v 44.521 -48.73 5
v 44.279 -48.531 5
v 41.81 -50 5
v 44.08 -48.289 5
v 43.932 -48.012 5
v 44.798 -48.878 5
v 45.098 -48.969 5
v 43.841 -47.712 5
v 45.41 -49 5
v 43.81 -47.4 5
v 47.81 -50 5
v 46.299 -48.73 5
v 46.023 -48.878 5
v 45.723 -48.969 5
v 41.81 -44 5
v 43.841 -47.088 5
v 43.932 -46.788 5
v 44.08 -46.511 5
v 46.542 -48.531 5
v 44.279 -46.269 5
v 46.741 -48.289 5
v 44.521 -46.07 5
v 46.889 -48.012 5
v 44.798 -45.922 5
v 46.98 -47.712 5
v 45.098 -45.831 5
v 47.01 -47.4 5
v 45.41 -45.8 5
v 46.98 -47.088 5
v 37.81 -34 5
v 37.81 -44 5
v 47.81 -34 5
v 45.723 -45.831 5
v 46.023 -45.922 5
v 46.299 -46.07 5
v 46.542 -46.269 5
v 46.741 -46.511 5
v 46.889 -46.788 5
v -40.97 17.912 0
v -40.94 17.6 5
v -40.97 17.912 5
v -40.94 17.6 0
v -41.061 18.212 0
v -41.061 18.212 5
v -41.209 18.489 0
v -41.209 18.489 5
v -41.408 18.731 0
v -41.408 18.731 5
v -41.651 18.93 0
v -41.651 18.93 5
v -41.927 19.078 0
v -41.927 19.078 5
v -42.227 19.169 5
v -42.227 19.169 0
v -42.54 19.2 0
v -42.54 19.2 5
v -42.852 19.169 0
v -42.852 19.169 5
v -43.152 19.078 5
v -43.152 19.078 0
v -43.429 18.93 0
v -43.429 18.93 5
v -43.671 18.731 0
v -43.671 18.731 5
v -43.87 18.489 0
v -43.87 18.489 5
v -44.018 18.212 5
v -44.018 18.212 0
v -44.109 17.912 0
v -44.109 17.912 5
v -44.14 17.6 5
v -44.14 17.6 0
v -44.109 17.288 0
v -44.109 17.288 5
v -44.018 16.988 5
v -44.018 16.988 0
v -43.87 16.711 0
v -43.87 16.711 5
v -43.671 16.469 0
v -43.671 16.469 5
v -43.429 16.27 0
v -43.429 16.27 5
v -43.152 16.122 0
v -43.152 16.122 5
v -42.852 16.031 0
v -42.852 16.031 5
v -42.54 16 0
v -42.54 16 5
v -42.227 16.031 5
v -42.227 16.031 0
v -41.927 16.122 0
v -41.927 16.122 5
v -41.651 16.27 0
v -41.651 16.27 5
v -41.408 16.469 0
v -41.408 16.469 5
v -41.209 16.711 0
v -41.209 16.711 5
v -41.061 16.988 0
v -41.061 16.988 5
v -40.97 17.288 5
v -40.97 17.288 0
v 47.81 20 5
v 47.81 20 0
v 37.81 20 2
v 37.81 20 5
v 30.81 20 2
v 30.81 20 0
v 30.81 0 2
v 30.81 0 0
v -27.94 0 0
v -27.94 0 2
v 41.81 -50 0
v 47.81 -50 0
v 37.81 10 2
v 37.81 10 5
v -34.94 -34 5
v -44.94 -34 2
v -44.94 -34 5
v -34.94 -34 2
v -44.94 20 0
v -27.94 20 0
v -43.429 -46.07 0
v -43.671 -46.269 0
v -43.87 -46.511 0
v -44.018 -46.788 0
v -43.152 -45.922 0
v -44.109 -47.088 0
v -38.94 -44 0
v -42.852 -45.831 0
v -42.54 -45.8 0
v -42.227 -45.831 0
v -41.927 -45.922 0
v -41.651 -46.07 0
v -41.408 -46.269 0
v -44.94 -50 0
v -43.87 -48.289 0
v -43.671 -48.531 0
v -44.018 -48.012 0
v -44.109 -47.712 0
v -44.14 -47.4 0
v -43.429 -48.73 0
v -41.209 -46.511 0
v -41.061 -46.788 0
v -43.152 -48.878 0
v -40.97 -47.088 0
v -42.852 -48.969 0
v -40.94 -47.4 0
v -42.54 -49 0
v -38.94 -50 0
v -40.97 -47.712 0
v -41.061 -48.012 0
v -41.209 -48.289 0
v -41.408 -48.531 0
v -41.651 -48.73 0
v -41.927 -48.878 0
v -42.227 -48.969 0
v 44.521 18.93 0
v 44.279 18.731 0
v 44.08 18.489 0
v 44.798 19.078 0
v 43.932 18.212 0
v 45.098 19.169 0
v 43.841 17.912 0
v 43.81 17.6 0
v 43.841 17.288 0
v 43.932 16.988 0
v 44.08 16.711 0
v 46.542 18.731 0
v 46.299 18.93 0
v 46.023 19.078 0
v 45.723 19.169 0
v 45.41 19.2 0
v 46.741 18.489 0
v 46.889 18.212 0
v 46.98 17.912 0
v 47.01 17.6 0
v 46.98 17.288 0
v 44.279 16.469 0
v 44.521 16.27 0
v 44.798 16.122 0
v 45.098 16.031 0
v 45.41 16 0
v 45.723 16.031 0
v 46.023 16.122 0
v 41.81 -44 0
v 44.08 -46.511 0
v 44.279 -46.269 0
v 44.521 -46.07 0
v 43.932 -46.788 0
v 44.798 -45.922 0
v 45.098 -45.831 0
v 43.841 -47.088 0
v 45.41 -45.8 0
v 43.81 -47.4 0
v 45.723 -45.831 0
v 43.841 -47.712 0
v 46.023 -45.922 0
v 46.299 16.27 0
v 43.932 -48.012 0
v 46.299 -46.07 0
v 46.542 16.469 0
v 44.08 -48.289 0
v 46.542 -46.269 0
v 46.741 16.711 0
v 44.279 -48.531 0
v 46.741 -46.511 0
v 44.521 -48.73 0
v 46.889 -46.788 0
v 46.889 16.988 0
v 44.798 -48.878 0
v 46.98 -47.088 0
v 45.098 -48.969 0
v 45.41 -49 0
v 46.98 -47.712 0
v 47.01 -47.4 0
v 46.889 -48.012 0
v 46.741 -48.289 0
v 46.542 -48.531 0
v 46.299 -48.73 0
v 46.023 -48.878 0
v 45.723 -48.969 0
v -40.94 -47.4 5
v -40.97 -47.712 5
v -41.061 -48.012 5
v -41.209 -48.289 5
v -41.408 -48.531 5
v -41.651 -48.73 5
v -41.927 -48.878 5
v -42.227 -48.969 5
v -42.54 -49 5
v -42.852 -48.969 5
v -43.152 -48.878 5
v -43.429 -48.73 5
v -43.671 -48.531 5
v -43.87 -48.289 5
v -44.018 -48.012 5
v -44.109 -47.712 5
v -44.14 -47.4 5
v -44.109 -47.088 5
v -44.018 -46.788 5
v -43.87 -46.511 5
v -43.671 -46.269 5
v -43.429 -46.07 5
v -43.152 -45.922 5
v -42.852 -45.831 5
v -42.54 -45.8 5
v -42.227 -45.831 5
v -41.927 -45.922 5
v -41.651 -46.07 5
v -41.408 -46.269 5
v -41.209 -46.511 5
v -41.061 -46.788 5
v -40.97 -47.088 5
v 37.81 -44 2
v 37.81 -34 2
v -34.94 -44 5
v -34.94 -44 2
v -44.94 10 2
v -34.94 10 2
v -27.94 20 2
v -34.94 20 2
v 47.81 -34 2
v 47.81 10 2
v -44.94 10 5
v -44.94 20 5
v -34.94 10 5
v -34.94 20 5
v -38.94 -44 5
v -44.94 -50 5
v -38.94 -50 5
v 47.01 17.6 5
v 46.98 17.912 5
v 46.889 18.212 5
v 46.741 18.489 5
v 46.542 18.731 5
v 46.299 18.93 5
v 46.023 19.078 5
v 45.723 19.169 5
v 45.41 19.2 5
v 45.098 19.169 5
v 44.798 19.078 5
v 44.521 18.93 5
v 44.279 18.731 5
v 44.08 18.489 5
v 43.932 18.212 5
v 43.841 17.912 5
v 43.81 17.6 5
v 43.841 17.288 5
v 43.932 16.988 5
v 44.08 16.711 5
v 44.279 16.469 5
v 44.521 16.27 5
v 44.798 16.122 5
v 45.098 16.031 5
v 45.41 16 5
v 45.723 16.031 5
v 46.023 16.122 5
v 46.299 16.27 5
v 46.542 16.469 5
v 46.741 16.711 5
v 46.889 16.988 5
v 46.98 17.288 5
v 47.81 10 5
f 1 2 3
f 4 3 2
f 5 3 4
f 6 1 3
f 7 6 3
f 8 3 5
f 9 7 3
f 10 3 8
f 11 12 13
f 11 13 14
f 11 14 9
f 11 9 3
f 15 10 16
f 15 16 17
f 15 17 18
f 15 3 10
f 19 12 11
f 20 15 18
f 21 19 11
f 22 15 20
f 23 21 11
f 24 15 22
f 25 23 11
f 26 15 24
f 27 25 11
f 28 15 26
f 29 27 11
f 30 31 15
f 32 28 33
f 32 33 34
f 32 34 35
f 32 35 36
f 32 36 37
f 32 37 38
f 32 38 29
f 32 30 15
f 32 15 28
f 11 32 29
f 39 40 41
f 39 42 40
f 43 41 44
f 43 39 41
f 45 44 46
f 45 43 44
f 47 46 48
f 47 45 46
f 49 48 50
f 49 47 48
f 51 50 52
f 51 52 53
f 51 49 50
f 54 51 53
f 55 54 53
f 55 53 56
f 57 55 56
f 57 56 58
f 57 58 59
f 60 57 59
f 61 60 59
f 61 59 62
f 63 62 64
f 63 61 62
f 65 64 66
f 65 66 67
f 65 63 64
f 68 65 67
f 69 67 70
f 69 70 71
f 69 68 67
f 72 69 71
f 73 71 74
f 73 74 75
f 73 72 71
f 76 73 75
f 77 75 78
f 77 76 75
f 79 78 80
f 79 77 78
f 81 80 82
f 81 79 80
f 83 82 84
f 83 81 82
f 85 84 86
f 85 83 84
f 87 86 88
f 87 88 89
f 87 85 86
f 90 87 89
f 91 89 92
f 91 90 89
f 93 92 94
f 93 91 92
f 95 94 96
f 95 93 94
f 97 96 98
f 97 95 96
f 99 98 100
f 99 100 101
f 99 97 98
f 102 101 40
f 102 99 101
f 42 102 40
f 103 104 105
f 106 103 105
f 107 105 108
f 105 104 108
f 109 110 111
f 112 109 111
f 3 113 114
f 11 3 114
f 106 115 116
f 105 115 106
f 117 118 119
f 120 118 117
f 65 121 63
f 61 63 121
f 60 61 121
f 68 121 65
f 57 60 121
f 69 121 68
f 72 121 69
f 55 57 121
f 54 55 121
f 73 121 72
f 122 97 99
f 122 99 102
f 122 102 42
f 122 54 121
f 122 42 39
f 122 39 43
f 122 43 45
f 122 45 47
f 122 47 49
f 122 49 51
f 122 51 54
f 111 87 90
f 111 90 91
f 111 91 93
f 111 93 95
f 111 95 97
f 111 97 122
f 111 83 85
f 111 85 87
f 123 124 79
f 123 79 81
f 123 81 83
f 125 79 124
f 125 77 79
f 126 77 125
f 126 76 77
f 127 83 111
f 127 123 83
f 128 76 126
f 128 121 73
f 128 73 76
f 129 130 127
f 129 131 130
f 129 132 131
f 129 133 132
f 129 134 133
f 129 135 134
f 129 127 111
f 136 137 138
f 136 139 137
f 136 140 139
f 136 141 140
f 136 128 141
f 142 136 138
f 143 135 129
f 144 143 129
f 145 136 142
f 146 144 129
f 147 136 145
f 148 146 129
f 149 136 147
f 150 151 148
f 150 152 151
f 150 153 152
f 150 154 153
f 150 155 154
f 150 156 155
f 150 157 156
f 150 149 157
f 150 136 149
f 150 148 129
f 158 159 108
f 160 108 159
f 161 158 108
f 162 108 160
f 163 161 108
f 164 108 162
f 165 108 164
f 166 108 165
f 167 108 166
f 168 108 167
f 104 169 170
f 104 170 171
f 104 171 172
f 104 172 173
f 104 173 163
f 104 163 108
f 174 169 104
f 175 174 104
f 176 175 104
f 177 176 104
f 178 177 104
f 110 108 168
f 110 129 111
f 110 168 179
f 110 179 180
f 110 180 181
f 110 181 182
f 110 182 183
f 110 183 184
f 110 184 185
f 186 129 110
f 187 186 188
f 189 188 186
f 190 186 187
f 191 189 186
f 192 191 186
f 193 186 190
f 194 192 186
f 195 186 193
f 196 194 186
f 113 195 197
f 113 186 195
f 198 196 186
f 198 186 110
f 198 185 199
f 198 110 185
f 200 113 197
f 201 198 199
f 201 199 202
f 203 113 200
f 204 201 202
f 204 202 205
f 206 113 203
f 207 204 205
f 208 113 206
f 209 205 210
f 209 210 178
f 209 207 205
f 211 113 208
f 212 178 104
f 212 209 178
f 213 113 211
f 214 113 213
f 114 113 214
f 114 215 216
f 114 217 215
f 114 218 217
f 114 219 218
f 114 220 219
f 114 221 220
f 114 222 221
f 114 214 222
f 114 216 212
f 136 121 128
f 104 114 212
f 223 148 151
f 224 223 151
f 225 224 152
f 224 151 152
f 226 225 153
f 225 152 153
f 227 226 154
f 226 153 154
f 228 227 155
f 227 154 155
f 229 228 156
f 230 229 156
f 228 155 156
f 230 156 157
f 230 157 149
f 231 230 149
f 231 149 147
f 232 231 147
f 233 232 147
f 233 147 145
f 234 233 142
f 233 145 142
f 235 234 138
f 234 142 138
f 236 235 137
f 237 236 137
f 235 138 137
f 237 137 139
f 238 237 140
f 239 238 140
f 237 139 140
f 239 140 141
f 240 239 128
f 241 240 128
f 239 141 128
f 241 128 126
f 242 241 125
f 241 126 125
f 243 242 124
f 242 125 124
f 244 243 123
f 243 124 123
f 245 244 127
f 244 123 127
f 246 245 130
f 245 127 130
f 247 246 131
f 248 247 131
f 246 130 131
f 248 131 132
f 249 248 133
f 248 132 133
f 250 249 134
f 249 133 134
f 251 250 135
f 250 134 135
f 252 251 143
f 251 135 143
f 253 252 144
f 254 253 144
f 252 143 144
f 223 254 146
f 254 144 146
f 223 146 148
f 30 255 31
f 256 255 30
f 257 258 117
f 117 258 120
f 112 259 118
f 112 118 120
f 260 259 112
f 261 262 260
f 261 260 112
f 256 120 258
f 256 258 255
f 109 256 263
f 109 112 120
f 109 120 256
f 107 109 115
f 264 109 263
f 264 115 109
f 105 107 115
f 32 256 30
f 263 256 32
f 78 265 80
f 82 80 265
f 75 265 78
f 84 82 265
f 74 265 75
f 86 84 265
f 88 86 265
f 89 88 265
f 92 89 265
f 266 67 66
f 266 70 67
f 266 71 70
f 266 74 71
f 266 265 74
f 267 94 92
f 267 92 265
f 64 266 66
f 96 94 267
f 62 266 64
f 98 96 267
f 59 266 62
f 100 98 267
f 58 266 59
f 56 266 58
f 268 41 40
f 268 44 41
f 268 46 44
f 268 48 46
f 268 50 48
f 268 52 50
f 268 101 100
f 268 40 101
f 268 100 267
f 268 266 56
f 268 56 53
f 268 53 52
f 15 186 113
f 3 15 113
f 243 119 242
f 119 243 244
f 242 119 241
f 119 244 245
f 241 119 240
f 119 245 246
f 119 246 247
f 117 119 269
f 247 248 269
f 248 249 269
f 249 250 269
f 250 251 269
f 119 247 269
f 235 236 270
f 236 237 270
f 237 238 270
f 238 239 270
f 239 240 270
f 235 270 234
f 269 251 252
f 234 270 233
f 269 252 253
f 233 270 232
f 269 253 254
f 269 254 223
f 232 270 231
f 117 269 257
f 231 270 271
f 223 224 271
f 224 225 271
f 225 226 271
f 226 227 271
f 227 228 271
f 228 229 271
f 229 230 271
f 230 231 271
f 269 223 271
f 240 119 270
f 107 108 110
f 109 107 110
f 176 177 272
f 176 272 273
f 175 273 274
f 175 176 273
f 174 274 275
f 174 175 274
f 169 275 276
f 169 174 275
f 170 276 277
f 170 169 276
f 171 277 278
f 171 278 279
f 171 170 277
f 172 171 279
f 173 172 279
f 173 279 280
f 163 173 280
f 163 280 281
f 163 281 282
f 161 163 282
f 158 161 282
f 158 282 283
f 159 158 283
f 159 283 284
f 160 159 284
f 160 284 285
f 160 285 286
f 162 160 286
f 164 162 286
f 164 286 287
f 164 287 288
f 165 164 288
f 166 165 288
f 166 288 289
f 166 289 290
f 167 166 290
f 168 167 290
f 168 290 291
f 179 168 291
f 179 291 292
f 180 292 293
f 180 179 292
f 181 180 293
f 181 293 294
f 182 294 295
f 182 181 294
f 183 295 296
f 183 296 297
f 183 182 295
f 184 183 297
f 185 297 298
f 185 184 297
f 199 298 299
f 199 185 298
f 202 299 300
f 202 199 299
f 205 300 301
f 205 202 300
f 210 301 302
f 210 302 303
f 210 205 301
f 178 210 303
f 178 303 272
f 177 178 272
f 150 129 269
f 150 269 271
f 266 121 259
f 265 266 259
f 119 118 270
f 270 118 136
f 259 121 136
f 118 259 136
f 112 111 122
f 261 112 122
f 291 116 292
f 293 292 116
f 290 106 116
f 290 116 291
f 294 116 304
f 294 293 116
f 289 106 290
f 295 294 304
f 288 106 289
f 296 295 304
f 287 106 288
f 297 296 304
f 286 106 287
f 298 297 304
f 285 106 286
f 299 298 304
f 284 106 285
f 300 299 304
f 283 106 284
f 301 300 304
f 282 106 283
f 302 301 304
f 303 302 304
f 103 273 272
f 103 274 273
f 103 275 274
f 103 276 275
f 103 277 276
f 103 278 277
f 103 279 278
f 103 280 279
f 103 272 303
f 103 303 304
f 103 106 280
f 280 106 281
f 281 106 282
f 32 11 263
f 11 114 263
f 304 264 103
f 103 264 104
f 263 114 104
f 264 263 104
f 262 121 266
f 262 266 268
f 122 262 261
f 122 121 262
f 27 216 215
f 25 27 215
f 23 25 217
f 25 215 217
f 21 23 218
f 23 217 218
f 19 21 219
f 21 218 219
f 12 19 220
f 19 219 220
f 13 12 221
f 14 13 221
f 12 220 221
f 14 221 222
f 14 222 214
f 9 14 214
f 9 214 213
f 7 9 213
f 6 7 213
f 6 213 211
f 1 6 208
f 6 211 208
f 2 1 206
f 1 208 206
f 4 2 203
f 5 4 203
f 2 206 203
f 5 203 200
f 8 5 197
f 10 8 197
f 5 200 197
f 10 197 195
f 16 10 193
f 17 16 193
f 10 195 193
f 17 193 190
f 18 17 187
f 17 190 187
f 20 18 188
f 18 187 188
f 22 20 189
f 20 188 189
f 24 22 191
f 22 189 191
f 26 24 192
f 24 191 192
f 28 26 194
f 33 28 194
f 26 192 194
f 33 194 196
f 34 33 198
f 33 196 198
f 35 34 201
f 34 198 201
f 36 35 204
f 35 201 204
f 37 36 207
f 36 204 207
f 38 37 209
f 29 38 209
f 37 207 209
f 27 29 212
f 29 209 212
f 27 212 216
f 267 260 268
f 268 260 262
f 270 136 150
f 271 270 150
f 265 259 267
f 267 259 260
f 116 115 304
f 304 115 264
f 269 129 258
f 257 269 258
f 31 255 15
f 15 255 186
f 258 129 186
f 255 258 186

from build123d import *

# Parameters (mm, degrees)
F0_R     = 1.6
F1_DEPTH = 2
F2_W     = 10
F2_H     = 10
F2_R     = 1.6
F3_DEPTH = 3
F4_W     = 6
F4_H     = 6
F4_R     = 1.6
F5_DEPTH = 5


with BuildPart() as f1:
    # F0 (on Top) → F1 (new body)
    with BuildSketch(Plane.XY):
        Polygon((-27.939597, 0), (-27.939597, 20), (-44.939597, 20), (-44.939597, -44), (47.810403, -44), (47.810403, 20), (30.810403, 20), (30.810403, 0), align=None)
        with Locations((-42.539597, 17.6)):
            Circle(F0_R, mode=Mode.SUBTRACT)
        with Locations((45.410403, 17.6)):
            Circle(F0_R, mode=Mode.SUBTRACT)
    extrude(amount=F1_DEPTH)

    # F2 (on face) → F3 (join)
    with BuildSketch(Plane.XY.offset(2)):
        with Locations((-39.939597, 15)):
            Rectangle(F2_W, F2_H)
        with Locations((-42.539597, 17.6)):
            Circle(F2_R, mode=Mode.SUBTRACT)
        with Locations((42.810403, 15)):
            Rectangle(F2_W, F2_H)
        with Locations((45.410403, 17.6)):
            Circle(F2_R, mode=Mode.SUBTRACT)
        with Locations((-39.939597, -39)):
            Rectangle(F2_W, F2_H)
        with Locations((42.810403, -39)):
            Rectangle(F2_W, F2_H)
    extrude(amount=F3_DEPTH)

    # F4 (on face) → F5 (join)
    with BuildSketch(Plane(origin=(0, 0, 0), x_dir=(1, 0, 0), z_dir=(0, 0, -1))):
        with Locations((-41.939597, 47)):
            Rectangle(F4_W, F4_H)
        with Locations((-42.539597, 47.4)):
            Circle(F4_R, mode=Mode.SUBTRACT)
        with Locations((44.810403, 47)):
            Rectangle(F4_W, F4_H)
        with Locations((45.410403, 47.4)):
            Circle(F4_R, mode=Mode.SUBTRACT)
    extrude(amount=-F5_DEPTH)


solid = f1.part
